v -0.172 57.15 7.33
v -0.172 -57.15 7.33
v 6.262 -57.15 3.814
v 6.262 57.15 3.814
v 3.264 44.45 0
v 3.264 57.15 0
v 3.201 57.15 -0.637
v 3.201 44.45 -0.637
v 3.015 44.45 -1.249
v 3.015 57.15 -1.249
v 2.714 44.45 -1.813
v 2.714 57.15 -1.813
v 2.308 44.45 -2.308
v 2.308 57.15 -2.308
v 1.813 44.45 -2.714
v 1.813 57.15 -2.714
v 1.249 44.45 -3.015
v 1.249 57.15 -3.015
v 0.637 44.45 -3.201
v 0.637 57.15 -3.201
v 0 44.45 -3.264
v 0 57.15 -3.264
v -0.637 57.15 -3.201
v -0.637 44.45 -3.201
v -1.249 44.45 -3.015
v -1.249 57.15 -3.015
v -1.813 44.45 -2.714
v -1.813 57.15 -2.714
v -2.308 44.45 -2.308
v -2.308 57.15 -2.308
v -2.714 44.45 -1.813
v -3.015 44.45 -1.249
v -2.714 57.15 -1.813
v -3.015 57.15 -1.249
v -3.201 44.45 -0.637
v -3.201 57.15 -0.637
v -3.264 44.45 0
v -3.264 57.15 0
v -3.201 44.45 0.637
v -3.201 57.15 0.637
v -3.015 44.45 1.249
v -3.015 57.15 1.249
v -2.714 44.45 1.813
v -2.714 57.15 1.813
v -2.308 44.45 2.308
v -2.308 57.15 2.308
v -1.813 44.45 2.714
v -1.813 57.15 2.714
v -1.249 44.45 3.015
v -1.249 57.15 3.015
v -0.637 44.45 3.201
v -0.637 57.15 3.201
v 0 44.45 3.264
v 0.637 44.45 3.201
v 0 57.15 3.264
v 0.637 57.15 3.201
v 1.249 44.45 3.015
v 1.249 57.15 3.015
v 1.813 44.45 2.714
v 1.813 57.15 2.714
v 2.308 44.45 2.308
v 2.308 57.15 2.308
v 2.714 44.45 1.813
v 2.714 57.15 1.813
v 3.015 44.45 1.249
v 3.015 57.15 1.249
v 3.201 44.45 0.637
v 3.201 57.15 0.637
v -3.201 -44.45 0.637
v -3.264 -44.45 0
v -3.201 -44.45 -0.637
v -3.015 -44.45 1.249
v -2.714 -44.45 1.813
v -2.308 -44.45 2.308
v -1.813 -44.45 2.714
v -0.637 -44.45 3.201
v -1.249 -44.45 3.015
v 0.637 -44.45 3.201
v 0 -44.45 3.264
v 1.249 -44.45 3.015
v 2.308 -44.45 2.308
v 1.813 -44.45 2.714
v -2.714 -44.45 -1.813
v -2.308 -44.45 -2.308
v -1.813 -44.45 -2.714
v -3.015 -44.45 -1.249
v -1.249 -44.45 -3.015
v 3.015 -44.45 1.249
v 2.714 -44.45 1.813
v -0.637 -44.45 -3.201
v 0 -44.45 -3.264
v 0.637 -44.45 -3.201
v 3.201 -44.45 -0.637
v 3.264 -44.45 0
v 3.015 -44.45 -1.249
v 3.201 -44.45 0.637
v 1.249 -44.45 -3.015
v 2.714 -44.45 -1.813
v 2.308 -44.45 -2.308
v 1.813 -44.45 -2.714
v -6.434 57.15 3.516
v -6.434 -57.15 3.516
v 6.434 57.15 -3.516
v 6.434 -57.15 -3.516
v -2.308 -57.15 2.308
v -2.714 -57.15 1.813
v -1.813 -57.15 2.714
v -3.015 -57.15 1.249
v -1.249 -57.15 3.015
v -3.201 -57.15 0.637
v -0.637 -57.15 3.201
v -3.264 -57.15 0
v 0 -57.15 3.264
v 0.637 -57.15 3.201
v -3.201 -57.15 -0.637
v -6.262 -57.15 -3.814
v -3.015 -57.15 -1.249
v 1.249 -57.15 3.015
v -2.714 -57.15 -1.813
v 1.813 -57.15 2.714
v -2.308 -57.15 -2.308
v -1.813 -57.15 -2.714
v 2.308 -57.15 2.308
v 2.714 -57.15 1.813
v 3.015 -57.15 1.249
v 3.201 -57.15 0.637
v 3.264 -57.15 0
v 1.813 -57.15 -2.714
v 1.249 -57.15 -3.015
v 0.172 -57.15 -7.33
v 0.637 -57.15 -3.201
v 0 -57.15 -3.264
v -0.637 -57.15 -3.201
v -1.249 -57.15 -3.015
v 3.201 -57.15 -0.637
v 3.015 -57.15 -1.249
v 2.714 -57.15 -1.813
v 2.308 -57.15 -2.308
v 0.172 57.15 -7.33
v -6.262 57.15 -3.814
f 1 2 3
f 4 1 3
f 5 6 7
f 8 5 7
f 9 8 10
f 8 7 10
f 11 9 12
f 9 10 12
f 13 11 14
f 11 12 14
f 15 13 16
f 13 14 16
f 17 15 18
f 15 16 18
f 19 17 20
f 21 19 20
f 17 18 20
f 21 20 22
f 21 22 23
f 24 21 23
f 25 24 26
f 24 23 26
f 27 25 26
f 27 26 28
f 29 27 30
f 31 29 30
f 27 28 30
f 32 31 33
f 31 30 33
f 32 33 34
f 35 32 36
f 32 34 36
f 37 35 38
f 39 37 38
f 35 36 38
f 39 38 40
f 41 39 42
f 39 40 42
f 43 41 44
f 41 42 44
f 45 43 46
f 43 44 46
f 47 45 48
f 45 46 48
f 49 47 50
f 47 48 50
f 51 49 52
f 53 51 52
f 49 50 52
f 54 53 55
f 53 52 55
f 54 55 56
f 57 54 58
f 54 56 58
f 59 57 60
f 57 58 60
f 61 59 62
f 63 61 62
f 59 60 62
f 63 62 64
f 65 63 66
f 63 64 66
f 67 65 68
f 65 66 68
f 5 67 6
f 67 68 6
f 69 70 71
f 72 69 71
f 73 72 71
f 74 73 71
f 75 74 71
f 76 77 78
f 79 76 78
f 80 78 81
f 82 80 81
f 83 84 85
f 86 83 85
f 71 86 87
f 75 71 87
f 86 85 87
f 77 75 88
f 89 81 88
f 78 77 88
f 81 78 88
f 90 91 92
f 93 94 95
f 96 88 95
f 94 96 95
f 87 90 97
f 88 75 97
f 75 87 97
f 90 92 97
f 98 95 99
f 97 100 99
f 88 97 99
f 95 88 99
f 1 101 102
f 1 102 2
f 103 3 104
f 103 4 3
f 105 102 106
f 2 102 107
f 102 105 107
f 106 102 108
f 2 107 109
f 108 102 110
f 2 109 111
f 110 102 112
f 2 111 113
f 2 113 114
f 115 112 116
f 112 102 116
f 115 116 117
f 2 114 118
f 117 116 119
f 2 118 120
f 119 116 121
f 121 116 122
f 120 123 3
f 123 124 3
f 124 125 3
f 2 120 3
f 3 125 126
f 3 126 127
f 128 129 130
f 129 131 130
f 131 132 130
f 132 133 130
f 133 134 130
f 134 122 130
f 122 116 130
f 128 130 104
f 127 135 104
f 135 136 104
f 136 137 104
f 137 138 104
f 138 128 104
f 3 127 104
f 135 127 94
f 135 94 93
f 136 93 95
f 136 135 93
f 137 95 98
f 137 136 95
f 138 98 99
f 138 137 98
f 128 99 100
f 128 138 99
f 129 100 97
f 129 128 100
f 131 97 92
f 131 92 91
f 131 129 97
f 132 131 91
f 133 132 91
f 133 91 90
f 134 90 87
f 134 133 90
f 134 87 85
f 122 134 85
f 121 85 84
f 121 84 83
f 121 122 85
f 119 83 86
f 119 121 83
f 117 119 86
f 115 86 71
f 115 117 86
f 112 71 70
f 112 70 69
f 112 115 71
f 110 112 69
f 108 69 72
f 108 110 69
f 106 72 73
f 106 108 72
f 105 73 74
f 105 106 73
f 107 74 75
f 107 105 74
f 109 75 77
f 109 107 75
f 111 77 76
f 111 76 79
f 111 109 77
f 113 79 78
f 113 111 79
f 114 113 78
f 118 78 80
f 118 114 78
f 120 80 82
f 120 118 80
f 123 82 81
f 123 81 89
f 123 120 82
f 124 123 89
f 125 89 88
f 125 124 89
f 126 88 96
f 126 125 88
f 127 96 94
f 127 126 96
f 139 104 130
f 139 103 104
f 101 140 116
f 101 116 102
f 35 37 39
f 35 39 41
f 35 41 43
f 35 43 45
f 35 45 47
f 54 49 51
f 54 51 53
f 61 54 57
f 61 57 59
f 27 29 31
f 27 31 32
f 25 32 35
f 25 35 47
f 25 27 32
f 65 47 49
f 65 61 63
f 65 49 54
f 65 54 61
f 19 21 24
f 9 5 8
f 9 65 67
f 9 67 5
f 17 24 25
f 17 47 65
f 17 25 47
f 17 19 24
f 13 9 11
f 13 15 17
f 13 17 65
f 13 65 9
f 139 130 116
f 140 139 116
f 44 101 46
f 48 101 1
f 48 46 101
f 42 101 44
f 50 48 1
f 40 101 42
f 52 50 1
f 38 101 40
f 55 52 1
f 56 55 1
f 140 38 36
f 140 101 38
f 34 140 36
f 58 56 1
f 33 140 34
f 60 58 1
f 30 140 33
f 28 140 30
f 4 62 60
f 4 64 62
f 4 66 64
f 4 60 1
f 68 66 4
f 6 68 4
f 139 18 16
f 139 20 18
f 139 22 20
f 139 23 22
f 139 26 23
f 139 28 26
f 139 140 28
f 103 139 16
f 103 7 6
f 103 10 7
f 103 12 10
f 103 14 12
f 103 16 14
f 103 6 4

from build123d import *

# Parameters (mm, degrees)
BOSS_EXTRUDE1_DEPTH = 57.15
SKETCH2_R           = 3.2639
CUT_EXTRUDE1_DEPTH  = 12.7


with BuildPart() as part:
    # Sketch1 → Boss-Extrude1 (new body, symmetric)
    with BuildSketch(Plane(origin=(0, 0, 0), x_dir=(1, 0, 0), z_dir=(0, 1, 0))):
        Polygon((6.434399754, 3.515939866), (0.172306635, 7.330323578), (-6.262093119, 3.814383712), (-6.434399754, -3.515939866), (-0.172306635, -7.330323578), (6.262093119, -3.814383712), align=None)
    extrude(amount=BOSS_EXTRUDE1_DEPTH, both=True)

    # Sketch2 → Cut-Extrude1 (cut)
    with BuildSketch(Plane(origin=(0, 57.15, 0), x_dir=(1, 0, 0), z_dir=(0, 1, 0))):
        Circle(SKETCH2_R)
    cut_extrude1 = extrude(amount=-CUT_EXTRUDE1_DEPTH, mode=Mode.SUBTRACT)

    # Mirror1: Cut-Extrude1 across plane
    add(cut_extrude1.mirror(Plane.ZX), mode=Mode.SUBTRACT)


solid = part.part
